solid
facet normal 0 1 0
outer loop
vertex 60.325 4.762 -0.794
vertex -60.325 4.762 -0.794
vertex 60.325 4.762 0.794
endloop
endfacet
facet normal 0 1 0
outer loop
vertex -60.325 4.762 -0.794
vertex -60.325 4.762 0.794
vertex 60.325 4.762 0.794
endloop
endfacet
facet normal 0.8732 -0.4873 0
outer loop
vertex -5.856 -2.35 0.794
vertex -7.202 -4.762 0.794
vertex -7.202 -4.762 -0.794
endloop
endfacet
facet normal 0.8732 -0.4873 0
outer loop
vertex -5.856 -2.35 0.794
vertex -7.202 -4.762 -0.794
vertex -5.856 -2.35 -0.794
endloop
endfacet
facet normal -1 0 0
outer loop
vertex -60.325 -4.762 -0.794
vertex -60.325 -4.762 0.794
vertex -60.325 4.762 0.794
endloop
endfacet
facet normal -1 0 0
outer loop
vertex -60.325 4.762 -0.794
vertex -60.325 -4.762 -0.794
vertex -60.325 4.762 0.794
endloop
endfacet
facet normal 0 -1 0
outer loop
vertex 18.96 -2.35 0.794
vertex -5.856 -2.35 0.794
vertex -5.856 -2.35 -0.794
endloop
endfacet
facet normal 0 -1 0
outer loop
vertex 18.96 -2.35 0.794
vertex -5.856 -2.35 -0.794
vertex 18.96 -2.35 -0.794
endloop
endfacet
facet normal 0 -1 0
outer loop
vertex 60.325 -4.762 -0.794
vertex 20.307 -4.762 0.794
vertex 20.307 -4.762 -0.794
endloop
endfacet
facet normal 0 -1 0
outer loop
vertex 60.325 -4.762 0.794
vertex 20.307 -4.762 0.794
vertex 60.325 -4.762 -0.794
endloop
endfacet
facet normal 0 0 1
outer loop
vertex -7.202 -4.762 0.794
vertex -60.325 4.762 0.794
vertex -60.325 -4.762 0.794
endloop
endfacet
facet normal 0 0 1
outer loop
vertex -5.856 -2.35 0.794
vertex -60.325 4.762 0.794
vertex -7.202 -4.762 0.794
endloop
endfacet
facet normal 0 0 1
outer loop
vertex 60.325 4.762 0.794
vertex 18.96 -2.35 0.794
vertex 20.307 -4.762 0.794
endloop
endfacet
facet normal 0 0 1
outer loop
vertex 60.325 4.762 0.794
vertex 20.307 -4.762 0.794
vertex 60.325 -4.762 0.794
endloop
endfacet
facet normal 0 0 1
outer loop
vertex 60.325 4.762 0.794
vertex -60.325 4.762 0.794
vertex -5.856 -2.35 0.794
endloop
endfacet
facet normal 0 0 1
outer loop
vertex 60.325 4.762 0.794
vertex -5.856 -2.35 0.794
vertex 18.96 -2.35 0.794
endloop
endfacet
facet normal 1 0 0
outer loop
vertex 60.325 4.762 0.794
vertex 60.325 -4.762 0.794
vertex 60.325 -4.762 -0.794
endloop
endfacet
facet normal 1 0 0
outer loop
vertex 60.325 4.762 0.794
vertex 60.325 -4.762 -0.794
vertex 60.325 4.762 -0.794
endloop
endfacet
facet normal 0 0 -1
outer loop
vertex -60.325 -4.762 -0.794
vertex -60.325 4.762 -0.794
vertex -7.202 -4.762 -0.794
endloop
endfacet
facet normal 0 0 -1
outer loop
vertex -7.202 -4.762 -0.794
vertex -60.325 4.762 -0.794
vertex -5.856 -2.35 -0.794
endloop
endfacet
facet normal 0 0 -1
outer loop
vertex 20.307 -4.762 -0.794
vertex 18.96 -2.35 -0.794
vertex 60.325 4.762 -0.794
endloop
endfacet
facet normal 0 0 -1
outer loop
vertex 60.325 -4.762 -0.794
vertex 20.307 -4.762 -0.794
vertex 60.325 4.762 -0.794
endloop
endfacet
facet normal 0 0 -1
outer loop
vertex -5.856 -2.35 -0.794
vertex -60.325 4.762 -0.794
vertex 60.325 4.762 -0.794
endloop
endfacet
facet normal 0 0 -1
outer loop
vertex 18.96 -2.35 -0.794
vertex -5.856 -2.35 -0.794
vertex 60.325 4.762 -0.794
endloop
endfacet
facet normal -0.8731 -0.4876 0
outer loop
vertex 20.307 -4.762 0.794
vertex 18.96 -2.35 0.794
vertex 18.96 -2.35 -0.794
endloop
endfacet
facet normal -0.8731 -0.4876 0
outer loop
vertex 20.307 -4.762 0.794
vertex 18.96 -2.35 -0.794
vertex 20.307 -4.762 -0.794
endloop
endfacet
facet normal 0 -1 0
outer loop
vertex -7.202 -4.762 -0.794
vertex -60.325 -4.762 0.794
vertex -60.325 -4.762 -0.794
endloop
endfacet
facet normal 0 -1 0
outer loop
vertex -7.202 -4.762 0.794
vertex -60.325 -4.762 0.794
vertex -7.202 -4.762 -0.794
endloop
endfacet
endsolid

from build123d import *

# Parameters (mm, degrees)
SKETCH1_W           = 120.65
SKETCH1_H           = 9.525
BOSS_EXTRUDE1_DEPTH = 0.79375
CUT_EXTRUDE1_DEPTH  = 2.5875


with BuildPart() as part:
    # Sketch1 → Boss-Extrude1 (new body, symmetric)
    with BuildSketch(Plane.XY):
        Rectangle(SKETCH1_W, SKETCH1_H)
    extrude(amount=BOSS_EXTRUDE1_DEPTH, both=True)

    # Sketch2 → Cut-Extrude1 (cut, through all)
    with BuildSketch(Plane.XY.offset(0.79375)):
        Polygon((-7.202243564, -4.7625), (-5.855664106, -2.3495), (18.960360816, -2.3495), (20.306940273, -4.7625), align=None)
    extrude(amount=-CUT_EXTRUDE1_DEPTH, mode=Mode.SUBTRACT)


solid = part.part
